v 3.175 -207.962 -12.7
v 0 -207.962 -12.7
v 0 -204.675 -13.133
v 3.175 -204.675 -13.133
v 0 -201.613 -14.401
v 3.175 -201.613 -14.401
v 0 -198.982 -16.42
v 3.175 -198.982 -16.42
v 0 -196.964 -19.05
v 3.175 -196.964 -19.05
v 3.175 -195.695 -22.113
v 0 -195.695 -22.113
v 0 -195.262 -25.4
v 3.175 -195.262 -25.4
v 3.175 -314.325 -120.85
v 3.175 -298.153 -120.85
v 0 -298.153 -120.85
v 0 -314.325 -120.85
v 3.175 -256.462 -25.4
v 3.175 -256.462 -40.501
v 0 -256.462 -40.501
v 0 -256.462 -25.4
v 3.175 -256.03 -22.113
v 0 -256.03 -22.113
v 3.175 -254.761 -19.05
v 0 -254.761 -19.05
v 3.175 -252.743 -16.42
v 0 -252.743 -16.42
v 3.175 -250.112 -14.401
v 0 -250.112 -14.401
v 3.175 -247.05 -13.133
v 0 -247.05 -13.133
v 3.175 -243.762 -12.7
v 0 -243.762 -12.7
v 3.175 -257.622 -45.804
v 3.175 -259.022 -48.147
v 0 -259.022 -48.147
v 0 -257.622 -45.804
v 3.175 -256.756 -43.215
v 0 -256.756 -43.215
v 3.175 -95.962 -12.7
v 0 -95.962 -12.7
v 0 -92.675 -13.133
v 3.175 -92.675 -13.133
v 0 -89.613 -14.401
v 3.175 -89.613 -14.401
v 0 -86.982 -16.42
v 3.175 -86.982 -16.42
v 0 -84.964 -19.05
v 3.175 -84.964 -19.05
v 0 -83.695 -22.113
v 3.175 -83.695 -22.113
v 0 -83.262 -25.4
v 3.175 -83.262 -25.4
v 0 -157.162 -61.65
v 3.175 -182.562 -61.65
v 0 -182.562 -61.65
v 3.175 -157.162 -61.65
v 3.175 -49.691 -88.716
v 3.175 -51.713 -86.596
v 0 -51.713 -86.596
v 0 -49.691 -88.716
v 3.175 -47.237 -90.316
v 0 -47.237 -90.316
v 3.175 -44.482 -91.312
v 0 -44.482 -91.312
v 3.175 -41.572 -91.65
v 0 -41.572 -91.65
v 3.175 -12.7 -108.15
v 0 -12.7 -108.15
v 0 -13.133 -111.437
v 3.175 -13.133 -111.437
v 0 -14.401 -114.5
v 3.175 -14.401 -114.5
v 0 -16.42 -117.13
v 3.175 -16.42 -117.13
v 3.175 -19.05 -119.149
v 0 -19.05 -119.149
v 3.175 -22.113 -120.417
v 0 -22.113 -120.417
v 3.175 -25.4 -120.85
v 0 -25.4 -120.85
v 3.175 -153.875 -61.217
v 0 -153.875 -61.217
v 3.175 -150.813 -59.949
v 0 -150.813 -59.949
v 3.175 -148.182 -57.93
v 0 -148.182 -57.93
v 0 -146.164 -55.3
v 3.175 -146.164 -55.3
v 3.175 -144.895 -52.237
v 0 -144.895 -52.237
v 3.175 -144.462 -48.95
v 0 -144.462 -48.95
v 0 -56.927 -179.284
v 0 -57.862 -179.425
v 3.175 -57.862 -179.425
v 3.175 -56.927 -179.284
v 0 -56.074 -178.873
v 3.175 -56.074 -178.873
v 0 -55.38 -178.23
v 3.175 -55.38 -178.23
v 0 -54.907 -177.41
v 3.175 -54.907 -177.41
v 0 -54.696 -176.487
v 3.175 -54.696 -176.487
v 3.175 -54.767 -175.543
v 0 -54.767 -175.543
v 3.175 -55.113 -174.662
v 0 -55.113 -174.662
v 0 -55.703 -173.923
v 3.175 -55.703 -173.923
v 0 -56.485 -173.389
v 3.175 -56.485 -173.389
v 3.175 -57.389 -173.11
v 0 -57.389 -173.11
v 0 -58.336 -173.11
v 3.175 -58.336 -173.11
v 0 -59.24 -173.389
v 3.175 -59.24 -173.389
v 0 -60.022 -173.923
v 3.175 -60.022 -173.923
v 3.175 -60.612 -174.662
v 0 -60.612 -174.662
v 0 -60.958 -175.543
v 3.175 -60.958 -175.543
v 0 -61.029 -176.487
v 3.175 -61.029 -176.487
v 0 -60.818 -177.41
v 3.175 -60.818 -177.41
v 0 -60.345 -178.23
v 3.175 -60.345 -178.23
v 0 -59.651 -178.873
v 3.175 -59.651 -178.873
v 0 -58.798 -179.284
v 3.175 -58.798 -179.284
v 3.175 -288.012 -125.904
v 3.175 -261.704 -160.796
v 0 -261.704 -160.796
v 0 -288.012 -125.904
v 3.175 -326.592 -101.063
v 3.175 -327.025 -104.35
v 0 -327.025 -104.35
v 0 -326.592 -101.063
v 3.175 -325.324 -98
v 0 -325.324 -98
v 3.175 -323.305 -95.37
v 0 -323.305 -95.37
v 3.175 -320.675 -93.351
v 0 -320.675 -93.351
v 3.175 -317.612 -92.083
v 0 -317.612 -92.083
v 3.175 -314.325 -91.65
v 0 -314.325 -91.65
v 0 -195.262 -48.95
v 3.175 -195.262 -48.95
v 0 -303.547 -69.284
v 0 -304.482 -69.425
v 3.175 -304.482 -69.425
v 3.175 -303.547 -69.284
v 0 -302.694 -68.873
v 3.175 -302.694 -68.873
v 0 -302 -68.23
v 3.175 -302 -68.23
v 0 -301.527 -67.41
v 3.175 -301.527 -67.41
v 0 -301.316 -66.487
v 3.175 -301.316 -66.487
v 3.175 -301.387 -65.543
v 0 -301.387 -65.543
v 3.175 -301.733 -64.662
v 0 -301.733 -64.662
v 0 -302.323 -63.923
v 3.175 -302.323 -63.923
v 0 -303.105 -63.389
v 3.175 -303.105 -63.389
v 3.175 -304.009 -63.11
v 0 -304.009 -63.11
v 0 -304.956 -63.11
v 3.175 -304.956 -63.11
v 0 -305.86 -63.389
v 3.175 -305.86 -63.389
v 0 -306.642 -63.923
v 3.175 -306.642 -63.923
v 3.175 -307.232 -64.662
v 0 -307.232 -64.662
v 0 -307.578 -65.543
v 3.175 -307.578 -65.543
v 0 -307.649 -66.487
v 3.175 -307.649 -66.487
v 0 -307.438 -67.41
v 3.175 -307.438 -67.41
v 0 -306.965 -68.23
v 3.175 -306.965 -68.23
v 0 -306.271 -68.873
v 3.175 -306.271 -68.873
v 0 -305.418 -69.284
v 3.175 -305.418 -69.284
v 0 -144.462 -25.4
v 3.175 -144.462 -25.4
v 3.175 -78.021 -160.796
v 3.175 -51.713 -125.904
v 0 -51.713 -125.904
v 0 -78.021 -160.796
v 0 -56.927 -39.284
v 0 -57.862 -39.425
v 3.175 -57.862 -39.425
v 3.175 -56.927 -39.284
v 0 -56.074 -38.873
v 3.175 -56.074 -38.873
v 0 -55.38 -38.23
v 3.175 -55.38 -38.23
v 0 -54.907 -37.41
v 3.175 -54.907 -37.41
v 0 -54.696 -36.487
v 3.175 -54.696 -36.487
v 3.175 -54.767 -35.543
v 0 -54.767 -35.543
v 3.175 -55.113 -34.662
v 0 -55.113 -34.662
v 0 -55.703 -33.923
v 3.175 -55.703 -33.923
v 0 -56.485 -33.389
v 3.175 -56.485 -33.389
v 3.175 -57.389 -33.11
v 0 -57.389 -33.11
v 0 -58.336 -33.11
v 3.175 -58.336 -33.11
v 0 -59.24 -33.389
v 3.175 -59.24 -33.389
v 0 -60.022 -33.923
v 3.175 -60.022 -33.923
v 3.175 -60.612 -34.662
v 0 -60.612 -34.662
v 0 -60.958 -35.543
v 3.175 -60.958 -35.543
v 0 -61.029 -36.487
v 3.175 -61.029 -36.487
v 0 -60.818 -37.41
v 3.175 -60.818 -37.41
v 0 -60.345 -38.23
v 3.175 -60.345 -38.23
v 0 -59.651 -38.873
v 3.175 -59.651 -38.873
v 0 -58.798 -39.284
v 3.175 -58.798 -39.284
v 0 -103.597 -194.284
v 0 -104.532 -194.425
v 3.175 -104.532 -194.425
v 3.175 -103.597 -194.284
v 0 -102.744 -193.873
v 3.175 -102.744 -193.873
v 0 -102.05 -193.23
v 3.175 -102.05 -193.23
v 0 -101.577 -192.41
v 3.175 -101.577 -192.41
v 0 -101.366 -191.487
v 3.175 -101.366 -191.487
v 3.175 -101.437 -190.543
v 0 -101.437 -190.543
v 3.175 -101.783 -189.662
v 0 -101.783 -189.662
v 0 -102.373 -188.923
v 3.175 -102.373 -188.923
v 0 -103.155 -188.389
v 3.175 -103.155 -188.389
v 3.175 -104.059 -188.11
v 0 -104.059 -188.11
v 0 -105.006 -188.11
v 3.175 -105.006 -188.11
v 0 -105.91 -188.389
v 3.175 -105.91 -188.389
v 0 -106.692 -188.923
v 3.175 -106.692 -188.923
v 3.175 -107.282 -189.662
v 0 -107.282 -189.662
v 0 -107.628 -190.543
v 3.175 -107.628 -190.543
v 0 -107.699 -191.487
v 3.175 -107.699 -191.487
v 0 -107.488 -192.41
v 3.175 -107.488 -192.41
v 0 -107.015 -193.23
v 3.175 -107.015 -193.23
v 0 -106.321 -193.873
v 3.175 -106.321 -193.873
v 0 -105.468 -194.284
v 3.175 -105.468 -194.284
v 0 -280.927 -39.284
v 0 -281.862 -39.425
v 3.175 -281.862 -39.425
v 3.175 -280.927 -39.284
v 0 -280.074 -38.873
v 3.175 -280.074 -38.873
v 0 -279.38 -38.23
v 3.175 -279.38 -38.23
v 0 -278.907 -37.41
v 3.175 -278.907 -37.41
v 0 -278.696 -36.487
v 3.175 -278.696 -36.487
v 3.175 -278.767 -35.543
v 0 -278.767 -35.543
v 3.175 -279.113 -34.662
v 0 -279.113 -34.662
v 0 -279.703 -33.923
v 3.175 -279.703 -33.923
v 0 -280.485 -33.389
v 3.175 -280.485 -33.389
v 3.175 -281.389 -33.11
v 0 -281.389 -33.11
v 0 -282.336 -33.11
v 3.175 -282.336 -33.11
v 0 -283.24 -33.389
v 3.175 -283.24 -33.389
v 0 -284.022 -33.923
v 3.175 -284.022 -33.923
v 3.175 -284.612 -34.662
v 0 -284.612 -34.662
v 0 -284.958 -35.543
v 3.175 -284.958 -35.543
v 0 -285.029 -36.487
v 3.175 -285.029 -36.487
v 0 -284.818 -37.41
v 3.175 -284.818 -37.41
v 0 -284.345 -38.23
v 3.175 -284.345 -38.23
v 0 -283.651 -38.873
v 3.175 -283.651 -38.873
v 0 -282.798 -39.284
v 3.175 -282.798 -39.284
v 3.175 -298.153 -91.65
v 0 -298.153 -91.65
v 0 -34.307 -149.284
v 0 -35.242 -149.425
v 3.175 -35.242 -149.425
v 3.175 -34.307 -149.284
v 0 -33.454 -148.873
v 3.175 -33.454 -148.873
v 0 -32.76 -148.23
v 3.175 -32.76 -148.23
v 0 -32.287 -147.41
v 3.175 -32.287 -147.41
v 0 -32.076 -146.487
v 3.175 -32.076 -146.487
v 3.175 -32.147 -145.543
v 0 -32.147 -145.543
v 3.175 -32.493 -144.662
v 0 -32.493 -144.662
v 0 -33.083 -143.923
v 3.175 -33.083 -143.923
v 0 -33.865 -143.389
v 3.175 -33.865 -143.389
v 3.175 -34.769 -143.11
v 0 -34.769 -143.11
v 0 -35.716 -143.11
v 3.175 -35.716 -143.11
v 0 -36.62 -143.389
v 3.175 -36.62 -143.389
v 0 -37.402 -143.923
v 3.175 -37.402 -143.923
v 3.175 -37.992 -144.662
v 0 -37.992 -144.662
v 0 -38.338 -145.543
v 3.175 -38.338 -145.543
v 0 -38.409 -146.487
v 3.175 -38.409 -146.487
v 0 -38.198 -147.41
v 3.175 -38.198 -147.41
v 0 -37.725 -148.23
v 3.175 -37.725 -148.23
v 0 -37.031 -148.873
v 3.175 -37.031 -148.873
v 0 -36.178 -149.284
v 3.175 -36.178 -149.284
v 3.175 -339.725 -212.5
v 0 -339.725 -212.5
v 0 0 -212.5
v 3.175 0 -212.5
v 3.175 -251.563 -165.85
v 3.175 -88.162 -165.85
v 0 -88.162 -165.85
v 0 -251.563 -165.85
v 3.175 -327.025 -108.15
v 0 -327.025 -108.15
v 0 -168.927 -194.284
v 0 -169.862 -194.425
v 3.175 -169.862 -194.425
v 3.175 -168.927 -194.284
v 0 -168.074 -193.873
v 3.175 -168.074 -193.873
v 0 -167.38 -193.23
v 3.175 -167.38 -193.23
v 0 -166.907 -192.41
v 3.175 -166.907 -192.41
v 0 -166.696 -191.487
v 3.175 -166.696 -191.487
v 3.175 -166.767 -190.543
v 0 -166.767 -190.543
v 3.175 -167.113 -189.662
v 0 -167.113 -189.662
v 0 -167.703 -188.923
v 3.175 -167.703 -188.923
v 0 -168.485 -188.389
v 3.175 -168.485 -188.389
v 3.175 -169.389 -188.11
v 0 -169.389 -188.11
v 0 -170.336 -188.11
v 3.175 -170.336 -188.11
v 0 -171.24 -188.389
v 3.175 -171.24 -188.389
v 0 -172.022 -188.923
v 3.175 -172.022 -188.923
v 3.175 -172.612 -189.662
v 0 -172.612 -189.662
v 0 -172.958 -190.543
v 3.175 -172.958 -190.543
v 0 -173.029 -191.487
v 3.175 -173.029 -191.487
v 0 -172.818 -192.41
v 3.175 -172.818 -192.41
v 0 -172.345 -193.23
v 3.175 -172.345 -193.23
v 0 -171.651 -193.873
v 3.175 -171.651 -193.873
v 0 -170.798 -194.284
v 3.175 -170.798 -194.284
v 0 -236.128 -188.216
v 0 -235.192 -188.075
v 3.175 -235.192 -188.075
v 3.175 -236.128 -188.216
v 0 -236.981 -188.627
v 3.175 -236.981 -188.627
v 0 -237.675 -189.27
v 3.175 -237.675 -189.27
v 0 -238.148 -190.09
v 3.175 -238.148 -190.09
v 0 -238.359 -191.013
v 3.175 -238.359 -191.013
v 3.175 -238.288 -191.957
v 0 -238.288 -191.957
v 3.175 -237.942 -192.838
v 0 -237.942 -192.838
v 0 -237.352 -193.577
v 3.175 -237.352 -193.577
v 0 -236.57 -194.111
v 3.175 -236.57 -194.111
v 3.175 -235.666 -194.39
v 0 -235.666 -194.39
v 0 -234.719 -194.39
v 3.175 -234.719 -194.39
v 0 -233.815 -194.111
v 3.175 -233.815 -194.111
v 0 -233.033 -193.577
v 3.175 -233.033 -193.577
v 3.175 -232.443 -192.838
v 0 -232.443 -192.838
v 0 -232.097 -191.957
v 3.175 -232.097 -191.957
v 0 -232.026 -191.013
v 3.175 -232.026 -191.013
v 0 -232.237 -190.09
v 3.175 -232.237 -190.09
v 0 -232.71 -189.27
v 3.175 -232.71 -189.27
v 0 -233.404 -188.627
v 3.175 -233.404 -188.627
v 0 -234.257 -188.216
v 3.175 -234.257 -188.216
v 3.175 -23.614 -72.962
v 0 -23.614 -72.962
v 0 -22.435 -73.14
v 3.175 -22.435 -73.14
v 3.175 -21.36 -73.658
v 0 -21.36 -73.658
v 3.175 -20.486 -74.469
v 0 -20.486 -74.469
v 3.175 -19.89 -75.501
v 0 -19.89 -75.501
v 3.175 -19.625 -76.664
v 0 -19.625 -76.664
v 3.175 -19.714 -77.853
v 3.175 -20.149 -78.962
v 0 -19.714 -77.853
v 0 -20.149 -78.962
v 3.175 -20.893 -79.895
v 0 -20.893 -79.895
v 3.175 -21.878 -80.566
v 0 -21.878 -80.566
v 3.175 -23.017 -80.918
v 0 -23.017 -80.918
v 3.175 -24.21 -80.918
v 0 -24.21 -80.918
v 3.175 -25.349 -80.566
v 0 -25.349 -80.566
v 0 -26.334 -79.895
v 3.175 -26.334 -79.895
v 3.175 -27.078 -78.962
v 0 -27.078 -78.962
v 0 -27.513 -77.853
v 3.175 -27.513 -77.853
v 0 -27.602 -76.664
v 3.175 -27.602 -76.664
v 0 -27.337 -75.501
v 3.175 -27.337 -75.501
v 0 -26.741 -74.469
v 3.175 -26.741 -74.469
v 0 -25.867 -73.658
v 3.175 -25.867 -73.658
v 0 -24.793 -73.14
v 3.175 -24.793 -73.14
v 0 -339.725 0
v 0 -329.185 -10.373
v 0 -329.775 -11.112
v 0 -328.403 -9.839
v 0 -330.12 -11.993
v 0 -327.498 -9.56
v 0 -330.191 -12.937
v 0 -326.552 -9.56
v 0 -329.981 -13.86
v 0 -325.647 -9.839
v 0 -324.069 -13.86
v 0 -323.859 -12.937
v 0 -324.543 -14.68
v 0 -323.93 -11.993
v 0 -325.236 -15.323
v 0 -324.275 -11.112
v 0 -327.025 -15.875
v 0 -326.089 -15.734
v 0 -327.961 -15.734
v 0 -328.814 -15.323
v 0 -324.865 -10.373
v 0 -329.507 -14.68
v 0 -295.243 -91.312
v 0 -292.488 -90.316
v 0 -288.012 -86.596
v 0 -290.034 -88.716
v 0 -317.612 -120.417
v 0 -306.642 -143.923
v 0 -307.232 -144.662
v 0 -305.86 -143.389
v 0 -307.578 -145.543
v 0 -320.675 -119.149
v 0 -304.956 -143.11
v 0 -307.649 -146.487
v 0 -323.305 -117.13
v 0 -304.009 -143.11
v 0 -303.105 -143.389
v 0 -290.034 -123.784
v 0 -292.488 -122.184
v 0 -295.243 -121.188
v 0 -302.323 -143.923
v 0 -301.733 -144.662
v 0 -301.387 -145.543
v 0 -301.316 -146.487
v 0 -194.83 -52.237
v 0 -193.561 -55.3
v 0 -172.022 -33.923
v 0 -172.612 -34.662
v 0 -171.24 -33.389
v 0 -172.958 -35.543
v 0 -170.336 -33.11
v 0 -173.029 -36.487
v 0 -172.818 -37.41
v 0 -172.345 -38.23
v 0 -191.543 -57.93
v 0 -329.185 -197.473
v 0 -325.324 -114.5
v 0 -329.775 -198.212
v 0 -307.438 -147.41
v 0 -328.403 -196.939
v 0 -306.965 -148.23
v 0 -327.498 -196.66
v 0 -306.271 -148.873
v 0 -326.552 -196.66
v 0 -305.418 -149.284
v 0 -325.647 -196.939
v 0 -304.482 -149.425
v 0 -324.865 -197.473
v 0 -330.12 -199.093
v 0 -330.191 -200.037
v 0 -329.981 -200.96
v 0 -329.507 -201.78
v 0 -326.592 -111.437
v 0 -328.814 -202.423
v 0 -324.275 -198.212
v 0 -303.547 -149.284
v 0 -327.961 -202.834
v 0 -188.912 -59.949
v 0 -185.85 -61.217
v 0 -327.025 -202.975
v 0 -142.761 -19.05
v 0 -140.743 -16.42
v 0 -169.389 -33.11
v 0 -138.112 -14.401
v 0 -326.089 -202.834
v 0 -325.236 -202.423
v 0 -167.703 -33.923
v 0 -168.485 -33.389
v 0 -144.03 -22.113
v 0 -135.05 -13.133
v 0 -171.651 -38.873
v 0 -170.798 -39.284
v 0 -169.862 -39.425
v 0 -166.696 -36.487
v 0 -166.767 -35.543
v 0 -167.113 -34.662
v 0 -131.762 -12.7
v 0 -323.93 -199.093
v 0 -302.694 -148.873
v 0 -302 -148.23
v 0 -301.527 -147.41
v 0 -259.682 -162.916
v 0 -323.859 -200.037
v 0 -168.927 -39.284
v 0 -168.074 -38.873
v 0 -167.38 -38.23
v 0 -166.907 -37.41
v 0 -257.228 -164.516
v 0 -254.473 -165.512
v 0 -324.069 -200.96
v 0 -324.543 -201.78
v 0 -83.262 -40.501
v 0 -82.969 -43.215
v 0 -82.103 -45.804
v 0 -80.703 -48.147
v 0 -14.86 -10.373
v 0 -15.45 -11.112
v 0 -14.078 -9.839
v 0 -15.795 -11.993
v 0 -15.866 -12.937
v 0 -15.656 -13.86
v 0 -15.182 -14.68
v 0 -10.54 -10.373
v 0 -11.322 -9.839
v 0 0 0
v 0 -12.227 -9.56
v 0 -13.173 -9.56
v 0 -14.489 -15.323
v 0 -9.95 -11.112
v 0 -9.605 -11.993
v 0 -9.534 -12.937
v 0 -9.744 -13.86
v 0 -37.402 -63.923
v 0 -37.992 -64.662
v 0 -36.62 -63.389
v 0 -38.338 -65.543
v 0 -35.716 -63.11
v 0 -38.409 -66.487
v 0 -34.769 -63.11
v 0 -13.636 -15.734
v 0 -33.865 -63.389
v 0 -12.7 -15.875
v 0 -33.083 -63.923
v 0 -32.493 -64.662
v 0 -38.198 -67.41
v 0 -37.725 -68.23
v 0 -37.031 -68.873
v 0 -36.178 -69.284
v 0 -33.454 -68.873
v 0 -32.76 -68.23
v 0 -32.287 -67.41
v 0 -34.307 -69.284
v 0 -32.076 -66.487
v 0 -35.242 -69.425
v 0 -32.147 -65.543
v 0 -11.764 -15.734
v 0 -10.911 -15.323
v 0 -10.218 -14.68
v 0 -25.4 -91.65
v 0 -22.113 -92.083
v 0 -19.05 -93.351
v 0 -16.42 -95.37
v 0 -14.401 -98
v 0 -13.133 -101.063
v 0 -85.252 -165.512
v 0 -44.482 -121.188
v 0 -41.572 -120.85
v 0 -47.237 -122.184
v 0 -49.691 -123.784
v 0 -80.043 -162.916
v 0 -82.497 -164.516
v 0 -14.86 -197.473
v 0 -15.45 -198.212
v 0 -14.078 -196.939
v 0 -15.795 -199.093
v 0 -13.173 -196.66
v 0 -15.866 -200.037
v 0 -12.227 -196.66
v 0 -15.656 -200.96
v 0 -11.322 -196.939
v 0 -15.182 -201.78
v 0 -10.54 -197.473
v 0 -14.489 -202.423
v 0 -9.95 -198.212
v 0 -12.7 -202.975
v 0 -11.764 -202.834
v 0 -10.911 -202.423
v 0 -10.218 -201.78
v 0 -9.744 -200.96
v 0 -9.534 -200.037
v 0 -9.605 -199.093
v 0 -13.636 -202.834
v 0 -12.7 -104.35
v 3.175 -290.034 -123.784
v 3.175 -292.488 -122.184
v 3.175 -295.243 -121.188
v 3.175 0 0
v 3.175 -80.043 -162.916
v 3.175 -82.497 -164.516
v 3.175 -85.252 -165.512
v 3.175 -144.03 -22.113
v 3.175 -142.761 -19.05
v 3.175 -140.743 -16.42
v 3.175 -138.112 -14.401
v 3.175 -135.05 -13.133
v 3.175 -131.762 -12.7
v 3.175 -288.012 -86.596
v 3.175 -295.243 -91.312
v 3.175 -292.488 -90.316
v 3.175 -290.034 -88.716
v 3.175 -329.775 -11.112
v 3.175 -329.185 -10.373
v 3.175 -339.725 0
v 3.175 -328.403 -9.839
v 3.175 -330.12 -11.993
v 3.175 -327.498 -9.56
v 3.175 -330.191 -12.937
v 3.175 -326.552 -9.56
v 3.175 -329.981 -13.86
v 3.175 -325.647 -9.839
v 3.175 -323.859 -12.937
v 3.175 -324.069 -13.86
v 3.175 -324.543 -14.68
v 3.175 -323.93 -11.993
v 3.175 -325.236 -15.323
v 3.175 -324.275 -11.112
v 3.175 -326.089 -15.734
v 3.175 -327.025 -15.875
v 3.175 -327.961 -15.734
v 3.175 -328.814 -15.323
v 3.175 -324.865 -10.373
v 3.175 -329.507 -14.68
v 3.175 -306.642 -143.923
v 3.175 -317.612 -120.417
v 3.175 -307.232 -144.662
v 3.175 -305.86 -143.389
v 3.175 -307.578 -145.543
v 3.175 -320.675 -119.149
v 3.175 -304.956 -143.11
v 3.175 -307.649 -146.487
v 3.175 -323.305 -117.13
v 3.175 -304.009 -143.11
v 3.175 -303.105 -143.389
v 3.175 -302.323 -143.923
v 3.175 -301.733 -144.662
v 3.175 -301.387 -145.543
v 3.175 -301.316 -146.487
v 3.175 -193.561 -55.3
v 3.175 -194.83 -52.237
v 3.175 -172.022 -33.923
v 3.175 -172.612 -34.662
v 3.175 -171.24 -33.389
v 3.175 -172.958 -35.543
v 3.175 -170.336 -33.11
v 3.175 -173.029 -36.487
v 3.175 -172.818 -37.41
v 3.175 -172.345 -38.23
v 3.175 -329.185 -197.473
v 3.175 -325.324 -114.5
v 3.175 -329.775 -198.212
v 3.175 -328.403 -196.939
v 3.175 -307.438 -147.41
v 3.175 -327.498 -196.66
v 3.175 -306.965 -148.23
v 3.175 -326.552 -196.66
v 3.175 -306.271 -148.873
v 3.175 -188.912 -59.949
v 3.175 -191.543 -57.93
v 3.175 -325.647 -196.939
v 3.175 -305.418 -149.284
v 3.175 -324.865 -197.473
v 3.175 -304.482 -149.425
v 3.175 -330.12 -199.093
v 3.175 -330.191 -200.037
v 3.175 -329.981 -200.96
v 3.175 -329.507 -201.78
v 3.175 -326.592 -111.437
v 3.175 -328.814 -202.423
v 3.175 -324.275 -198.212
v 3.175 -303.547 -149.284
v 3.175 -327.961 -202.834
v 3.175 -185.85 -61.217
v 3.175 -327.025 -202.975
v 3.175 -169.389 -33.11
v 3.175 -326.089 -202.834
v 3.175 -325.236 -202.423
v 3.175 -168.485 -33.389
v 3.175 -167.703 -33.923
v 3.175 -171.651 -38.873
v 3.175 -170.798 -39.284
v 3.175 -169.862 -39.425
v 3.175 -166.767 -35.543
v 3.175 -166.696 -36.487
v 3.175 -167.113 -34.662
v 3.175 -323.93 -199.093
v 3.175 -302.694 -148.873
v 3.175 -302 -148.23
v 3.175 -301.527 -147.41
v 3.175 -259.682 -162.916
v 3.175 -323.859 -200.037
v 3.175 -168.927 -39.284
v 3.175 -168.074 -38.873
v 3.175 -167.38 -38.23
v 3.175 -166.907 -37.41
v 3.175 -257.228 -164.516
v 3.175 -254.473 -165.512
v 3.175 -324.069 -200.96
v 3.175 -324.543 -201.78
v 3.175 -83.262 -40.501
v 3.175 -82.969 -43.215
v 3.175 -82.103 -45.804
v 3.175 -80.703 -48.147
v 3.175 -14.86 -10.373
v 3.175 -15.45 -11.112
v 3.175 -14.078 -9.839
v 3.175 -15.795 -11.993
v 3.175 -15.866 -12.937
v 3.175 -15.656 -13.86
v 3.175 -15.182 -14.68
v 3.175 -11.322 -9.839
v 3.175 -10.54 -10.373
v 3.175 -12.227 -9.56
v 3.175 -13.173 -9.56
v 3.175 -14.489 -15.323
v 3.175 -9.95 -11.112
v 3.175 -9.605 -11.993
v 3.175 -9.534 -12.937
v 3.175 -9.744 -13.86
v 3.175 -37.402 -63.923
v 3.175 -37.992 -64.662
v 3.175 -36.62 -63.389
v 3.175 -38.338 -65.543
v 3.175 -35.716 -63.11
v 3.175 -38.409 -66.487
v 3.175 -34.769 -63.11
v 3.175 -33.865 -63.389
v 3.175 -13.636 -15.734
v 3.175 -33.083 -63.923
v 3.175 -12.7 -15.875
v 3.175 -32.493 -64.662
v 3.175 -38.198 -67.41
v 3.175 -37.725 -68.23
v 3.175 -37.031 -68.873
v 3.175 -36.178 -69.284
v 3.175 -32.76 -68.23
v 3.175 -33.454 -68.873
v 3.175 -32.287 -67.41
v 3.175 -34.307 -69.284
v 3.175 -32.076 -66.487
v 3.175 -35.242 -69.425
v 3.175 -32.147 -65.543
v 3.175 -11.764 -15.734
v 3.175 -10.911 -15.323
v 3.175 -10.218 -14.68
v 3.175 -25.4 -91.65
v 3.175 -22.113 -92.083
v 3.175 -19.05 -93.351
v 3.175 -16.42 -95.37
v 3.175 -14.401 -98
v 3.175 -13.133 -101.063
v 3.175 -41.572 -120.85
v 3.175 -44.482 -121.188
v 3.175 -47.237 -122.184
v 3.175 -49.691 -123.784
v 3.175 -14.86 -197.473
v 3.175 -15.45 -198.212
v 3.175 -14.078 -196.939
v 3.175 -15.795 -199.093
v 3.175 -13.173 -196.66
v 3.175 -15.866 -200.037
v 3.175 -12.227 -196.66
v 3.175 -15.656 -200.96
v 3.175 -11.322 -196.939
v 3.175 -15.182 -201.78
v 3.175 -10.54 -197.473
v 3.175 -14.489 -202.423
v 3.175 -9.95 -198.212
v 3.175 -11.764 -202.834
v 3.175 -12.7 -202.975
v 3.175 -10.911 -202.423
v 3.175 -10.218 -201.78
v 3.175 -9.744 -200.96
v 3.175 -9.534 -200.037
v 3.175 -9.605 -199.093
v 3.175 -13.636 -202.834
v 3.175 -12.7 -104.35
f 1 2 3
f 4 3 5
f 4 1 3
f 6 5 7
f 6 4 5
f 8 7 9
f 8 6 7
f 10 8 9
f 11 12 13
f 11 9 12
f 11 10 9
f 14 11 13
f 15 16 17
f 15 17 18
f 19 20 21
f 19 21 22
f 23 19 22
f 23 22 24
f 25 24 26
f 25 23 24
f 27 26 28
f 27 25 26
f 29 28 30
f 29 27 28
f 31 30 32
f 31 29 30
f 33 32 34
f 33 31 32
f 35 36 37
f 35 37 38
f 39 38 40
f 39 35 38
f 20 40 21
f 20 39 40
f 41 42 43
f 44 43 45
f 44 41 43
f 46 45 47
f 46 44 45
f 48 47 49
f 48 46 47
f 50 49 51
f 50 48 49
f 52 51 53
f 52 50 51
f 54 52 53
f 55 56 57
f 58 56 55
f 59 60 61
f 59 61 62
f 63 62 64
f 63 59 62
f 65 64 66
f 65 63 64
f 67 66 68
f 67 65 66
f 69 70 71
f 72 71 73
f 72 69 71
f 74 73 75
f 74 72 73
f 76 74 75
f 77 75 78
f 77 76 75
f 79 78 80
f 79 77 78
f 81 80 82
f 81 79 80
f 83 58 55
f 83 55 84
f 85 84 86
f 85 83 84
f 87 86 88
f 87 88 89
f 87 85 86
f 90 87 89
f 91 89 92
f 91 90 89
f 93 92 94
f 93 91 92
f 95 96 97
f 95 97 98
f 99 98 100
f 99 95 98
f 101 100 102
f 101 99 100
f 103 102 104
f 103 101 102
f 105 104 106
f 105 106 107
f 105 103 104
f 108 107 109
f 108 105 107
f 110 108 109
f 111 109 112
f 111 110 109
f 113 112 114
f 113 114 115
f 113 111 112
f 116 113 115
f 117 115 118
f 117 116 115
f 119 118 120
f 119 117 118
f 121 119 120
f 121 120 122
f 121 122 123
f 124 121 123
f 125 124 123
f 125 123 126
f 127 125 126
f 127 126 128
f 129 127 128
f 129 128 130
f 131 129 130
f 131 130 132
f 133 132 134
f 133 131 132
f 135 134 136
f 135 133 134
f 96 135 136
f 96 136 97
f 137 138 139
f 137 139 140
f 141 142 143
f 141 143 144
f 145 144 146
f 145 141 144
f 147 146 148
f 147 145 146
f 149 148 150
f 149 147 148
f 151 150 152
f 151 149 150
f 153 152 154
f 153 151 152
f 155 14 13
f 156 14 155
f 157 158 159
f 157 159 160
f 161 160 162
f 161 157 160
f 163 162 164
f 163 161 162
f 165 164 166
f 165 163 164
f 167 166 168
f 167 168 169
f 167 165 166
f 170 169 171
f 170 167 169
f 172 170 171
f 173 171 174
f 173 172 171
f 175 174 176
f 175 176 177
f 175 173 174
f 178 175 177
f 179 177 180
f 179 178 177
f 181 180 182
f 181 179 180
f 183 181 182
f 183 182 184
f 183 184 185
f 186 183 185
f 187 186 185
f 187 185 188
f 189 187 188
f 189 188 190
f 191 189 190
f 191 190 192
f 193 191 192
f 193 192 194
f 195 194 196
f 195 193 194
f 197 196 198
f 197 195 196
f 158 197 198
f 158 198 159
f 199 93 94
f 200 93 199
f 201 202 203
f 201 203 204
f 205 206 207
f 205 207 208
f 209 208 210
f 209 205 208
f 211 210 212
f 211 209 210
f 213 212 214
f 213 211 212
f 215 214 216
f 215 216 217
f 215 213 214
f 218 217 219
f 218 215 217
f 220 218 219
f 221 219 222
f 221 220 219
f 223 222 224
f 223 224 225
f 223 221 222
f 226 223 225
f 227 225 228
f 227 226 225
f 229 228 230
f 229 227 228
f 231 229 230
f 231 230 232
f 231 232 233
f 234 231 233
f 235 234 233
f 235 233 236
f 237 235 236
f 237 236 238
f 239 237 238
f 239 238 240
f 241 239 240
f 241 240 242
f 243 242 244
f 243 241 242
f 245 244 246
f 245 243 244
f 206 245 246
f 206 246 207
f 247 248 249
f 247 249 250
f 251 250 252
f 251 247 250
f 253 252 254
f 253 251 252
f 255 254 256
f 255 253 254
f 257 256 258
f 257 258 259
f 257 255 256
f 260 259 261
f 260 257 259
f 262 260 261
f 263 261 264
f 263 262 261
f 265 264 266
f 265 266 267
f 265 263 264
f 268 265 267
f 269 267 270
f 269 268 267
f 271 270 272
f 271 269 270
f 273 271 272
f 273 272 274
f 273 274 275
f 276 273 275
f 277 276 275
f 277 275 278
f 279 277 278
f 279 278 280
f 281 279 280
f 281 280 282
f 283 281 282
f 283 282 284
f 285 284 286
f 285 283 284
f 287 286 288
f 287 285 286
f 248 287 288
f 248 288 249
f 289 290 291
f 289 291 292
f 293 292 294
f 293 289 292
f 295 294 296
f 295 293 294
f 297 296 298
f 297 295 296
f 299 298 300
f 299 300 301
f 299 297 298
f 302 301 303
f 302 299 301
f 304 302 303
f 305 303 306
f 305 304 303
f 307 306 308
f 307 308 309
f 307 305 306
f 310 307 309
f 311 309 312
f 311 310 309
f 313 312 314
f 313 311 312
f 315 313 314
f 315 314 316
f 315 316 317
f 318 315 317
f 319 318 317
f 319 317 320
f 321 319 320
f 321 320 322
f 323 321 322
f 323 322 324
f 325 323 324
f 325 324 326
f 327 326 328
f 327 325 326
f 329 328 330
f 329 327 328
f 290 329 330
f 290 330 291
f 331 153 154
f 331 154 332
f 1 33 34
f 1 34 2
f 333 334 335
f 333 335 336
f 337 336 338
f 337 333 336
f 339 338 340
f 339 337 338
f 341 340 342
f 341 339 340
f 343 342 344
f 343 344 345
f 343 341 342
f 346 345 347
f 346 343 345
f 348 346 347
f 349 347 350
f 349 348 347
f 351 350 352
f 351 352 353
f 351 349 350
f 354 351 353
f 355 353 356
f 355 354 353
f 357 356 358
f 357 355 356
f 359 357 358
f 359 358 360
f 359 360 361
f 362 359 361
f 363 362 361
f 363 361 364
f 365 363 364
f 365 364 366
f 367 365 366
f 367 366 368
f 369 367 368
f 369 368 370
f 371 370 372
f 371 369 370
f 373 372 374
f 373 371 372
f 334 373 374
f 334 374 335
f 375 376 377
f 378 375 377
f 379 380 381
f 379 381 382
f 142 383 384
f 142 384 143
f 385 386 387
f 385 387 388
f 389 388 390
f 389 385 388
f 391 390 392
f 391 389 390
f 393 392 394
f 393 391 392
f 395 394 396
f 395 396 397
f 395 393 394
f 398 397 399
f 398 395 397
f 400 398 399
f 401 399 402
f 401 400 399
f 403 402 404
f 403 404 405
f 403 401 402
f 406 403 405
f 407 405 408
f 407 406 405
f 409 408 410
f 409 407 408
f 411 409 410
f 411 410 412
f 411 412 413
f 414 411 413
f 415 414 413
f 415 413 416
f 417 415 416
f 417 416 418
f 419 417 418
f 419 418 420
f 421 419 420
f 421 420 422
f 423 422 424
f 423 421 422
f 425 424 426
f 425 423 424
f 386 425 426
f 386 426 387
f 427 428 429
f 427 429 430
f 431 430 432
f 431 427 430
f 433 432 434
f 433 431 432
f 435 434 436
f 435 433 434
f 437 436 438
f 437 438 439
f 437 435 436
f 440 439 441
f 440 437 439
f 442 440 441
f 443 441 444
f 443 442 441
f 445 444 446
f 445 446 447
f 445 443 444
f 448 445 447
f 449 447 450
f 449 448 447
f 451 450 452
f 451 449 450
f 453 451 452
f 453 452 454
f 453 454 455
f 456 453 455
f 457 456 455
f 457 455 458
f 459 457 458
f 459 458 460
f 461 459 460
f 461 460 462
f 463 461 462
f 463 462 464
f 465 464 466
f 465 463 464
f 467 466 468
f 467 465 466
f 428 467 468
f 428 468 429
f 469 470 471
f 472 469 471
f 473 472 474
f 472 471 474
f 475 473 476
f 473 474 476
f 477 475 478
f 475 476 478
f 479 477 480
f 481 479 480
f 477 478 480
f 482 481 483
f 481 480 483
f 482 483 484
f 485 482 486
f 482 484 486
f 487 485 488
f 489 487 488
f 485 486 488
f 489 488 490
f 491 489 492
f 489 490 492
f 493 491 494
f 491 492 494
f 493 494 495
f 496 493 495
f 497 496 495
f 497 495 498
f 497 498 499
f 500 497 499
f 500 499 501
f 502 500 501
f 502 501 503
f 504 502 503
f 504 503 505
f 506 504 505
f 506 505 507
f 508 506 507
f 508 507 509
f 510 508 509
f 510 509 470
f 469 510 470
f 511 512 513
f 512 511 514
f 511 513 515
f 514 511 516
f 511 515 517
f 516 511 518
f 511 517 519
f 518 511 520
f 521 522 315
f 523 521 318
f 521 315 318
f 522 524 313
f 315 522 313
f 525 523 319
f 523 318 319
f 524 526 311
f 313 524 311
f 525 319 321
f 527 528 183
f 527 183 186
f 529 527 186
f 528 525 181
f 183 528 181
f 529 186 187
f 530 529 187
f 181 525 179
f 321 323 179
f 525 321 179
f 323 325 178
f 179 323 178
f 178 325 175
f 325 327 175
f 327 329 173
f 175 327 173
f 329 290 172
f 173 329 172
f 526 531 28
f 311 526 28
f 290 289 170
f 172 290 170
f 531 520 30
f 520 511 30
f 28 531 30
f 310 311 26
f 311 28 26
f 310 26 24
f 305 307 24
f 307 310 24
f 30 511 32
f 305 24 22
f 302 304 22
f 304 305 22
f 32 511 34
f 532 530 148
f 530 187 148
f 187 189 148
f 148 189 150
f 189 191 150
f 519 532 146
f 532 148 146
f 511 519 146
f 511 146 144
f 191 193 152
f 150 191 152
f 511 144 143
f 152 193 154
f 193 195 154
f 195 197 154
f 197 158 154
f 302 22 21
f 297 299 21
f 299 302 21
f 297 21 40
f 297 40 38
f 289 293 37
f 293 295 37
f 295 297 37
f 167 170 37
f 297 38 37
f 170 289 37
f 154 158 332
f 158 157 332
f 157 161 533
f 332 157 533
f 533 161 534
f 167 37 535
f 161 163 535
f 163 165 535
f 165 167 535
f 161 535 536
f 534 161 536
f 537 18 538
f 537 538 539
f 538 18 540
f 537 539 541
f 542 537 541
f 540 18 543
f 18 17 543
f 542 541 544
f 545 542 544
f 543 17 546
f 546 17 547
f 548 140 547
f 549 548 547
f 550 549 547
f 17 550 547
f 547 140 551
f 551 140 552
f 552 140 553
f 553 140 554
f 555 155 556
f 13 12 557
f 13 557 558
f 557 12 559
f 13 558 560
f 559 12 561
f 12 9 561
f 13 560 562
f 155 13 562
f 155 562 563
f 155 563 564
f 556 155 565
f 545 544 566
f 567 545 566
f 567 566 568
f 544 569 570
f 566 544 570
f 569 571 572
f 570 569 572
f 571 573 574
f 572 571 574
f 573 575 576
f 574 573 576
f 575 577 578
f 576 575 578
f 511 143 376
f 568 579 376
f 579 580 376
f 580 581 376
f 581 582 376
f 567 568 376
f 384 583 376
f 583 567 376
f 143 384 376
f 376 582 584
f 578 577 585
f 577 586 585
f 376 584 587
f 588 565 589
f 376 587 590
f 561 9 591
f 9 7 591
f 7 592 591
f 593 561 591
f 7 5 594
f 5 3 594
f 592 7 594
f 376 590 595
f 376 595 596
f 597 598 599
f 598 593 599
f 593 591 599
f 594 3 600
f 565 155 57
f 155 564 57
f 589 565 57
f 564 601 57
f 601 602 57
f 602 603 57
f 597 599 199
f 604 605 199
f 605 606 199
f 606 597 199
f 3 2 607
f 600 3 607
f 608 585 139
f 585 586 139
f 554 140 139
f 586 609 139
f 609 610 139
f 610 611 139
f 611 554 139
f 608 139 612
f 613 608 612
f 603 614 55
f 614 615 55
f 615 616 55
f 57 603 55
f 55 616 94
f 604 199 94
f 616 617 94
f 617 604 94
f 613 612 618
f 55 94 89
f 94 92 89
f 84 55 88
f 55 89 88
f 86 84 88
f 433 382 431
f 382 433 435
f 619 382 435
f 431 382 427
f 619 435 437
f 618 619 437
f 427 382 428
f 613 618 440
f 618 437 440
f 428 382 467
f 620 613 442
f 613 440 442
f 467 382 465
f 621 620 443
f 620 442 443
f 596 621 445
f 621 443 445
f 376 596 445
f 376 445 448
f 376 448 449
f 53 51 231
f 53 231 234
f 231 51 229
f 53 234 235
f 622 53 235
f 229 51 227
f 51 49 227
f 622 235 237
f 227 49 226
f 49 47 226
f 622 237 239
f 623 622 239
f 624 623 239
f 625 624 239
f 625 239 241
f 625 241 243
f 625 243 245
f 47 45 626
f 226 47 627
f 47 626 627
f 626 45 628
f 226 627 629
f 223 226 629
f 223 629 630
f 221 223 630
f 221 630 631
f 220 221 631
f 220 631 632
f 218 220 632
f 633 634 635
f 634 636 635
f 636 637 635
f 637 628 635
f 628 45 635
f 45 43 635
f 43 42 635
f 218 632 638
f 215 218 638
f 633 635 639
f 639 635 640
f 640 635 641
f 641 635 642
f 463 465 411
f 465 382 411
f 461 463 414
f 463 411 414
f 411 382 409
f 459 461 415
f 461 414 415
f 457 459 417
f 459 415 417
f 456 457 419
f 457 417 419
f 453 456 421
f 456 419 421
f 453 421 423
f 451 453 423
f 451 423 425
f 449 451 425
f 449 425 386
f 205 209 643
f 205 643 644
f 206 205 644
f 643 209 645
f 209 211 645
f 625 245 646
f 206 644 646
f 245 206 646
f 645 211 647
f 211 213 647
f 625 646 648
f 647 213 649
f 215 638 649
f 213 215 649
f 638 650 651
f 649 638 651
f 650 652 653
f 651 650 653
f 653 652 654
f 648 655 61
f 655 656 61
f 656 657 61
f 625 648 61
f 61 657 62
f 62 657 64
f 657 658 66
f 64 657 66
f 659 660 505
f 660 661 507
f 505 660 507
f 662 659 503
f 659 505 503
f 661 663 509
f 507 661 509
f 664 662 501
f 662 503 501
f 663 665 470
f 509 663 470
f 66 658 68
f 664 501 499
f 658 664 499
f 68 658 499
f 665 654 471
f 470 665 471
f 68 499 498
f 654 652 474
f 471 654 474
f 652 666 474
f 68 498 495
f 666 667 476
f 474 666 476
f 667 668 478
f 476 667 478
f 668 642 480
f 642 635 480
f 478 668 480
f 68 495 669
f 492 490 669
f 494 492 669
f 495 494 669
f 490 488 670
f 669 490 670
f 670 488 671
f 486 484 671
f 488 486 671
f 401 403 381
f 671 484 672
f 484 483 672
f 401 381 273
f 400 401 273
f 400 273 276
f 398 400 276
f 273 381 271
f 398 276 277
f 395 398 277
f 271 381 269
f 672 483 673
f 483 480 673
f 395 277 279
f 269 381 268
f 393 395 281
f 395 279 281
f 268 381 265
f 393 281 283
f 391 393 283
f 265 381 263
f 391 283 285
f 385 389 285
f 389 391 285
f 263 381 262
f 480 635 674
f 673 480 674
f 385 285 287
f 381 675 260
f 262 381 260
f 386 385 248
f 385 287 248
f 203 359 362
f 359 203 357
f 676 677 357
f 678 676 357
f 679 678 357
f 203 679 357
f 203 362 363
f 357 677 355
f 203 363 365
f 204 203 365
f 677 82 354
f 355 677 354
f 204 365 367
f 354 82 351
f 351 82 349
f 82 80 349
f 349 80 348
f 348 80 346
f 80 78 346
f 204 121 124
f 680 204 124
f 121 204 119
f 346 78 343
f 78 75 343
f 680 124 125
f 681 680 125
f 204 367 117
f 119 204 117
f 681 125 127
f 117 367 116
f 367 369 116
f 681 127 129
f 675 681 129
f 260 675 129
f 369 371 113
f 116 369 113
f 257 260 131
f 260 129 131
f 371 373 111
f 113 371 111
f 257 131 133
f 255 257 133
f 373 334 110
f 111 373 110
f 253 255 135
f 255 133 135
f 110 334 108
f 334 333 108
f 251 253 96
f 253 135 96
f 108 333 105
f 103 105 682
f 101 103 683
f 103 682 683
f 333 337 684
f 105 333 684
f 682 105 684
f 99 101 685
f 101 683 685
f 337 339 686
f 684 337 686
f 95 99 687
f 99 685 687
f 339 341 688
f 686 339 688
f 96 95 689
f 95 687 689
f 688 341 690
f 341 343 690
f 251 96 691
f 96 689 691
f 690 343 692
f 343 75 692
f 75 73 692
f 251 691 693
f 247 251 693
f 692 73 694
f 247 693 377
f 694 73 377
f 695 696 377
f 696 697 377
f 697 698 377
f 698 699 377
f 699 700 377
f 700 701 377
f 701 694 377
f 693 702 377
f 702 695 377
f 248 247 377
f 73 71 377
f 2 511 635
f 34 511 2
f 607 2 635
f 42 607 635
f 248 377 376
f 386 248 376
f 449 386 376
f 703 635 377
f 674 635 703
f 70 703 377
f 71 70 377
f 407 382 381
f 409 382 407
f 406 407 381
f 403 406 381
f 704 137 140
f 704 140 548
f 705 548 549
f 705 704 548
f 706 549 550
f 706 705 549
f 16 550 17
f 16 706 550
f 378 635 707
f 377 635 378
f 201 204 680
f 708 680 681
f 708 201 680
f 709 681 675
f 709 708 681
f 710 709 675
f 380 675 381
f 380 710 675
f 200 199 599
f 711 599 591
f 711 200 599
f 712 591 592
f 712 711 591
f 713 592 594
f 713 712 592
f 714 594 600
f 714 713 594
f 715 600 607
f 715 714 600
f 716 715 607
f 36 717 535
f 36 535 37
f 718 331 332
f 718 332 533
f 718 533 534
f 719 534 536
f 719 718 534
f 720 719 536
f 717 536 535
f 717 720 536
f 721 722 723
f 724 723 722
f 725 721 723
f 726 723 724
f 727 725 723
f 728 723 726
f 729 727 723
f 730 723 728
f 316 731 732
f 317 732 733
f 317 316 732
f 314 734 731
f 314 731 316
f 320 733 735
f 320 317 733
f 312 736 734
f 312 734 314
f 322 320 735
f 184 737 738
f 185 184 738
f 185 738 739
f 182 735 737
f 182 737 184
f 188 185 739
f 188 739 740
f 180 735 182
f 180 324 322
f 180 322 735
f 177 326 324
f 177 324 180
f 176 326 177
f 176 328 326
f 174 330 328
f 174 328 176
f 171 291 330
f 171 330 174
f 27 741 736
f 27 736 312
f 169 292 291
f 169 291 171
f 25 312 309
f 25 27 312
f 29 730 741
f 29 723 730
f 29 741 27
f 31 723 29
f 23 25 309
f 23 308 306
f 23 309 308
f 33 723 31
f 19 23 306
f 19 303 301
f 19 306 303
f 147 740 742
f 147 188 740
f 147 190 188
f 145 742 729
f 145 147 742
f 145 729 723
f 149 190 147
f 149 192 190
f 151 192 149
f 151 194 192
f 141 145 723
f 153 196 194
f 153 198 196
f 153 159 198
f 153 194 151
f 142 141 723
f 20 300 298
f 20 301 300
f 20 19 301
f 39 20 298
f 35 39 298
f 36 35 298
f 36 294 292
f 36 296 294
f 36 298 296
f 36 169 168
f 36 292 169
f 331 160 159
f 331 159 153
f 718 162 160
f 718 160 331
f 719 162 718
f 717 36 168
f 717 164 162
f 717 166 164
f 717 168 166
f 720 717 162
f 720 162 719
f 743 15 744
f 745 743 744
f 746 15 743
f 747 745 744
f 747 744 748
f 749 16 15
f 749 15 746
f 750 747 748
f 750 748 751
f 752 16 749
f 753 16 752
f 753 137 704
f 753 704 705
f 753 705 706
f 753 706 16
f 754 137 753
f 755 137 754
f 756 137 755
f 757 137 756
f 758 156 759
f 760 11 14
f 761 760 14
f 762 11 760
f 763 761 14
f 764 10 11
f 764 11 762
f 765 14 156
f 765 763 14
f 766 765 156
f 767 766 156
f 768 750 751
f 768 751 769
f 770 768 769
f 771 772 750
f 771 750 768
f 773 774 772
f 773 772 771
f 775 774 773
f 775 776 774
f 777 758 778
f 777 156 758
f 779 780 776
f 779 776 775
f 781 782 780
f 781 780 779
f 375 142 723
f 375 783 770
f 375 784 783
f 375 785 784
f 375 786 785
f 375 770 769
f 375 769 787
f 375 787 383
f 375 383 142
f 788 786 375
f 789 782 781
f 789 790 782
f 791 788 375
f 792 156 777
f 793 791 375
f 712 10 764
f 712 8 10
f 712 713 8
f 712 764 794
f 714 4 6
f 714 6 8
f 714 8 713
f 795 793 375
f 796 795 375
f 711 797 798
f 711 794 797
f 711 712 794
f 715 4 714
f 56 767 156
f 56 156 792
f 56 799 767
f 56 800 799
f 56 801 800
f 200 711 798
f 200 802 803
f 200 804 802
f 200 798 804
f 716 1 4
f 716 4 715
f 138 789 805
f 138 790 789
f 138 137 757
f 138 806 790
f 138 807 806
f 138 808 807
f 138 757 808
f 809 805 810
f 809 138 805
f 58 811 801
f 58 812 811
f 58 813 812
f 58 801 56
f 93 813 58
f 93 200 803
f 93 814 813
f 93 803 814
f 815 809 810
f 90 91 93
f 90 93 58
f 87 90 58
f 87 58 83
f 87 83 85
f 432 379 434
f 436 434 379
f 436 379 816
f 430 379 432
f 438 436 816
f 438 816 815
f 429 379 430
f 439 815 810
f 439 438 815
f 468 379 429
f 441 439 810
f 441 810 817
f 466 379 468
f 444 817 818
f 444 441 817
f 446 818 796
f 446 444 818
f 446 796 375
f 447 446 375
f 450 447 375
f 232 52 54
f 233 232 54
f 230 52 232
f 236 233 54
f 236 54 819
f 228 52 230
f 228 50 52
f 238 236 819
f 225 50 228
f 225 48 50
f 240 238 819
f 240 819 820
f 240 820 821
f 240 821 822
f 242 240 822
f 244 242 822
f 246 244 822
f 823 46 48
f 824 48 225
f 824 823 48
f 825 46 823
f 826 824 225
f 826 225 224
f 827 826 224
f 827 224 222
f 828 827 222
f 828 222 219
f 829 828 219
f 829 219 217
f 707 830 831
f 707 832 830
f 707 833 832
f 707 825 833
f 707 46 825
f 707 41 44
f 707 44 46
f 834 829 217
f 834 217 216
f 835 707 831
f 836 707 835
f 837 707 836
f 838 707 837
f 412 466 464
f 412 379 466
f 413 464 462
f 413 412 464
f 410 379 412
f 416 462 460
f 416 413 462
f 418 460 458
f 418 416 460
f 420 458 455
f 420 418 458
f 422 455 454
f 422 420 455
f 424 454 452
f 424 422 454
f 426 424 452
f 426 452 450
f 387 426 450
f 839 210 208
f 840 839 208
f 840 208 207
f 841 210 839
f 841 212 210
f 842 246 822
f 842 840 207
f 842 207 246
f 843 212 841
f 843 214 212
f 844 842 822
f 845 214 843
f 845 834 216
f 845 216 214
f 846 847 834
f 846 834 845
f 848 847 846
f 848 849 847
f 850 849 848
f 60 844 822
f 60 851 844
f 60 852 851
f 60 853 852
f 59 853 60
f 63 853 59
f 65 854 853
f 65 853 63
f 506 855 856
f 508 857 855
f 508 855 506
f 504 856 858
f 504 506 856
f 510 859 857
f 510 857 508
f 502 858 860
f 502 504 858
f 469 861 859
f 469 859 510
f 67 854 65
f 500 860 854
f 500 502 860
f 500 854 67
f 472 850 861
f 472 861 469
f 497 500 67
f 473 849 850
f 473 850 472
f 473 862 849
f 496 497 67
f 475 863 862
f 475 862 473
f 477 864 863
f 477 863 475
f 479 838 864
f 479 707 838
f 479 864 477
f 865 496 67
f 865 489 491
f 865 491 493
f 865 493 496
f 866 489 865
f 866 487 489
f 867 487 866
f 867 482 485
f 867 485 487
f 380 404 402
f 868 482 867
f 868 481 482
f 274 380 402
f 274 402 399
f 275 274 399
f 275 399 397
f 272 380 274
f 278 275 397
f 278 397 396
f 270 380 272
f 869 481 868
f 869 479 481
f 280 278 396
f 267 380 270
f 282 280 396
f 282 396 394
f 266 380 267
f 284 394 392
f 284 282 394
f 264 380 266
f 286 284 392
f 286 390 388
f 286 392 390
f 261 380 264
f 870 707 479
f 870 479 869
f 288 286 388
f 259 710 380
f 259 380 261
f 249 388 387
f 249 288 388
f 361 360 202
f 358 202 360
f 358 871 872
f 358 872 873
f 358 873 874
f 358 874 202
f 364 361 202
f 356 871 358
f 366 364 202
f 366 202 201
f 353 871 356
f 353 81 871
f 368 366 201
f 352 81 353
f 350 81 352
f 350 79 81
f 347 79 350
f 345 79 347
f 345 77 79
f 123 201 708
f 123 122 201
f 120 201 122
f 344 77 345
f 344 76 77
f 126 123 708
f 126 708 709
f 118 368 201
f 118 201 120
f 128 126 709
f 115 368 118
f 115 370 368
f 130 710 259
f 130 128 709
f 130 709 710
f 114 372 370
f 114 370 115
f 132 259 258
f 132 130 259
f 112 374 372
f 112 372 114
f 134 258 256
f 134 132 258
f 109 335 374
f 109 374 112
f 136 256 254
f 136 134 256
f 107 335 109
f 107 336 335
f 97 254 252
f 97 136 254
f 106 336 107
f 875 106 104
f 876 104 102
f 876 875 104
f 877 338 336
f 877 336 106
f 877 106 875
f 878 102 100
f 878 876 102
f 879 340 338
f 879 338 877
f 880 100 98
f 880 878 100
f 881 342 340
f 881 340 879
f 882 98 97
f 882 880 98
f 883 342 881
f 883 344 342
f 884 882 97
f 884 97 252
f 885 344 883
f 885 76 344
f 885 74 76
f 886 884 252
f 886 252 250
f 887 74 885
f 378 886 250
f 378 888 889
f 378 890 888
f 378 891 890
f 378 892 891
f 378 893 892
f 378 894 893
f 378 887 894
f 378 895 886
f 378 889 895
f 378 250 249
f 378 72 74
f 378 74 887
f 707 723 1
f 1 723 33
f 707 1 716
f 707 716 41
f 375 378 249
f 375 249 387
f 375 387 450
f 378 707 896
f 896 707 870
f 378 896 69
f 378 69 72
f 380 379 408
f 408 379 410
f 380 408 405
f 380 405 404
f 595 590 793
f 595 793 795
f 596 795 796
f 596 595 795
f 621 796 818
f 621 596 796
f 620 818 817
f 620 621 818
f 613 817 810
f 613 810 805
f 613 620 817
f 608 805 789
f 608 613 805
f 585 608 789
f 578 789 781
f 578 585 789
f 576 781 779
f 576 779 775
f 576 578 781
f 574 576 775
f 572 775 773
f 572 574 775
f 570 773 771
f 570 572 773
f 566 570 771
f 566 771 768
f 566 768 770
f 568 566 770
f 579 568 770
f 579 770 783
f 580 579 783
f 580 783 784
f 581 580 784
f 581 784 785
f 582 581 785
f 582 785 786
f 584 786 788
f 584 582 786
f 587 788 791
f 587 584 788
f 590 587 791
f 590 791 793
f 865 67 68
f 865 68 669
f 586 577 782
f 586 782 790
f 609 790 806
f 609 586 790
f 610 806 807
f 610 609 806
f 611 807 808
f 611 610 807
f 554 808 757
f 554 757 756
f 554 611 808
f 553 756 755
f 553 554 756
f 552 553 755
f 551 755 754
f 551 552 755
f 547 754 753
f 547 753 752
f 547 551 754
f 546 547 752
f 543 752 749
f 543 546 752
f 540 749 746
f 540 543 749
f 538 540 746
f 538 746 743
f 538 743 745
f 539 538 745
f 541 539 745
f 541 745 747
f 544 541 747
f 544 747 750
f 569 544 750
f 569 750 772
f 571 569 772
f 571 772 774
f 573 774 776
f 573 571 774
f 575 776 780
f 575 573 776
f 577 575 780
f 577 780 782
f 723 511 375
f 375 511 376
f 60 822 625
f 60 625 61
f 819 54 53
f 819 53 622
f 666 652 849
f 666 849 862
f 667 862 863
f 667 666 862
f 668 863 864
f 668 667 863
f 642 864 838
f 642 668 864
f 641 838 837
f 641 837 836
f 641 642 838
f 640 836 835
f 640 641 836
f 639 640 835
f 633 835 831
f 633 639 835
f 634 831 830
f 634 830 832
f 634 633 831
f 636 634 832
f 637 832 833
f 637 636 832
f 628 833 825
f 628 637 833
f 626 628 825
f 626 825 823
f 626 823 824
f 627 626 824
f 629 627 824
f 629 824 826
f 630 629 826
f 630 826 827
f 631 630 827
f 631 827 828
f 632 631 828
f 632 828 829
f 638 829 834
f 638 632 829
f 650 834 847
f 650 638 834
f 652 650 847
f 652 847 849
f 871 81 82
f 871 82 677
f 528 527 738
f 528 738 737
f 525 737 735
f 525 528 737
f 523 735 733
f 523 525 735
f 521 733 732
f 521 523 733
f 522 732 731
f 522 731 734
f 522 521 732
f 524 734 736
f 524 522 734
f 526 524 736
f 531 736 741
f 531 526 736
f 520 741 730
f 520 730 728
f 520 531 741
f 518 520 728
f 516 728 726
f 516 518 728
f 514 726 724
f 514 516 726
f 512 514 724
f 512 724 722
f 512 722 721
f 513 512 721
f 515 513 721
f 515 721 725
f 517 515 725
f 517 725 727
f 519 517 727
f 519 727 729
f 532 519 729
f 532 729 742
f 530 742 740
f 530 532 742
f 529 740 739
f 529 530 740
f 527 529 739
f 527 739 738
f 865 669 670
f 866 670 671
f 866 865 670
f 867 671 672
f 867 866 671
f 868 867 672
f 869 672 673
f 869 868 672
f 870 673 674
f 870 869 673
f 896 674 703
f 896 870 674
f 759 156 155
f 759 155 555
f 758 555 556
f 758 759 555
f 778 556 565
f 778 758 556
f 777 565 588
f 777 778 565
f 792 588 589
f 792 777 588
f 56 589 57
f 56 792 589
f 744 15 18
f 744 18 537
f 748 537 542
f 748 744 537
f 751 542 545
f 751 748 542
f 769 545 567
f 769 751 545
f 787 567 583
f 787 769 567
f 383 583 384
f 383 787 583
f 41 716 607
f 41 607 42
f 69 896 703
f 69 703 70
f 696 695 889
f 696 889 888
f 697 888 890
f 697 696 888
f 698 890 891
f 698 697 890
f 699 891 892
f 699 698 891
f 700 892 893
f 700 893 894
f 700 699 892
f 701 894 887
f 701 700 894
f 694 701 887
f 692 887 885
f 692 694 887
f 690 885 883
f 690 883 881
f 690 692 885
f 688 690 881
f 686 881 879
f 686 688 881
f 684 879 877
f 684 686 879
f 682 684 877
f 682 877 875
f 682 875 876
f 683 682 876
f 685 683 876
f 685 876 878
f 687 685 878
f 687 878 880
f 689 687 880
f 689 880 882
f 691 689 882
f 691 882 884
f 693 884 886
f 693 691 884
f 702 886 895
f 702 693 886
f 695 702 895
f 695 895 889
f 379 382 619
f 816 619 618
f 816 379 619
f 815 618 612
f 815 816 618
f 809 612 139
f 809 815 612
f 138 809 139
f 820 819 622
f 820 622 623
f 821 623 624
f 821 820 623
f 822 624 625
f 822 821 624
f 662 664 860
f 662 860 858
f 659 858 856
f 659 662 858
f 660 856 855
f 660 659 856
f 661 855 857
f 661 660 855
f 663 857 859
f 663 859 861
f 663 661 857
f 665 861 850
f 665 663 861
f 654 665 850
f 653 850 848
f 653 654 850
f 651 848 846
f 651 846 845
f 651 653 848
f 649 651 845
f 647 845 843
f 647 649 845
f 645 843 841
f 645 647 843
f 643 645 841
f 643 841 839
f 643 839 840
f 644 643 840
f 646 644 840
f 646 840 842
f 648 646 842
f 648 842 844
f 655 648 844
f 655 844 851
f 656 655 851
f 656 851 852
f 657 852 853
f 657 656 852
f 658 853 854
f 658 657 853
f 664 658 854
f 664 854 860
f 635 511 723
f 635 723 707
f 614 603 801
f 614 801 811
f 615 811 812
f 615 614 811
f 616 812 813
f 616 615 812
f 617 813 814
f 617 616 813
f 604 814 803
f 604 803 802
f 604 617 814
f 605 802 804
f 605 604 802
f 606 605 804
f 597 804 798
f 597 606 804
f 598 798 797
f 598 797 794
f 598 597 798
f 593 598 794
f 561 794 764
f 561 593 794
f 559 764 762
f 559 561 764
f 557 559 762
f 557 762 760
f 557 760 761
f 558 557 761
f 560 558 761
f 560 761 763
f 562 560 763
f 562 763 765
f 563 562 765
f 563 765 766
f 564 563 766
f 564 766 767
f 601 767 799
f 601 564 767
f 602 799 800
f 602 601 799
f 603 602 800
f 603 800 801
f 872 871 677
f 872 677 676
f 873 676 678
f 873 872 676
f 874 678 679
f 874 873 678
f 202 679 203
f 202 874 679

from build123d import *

# Parameters (mm, degrees)
SKETCH1_W           = 212.5
SKETCH1_H           = 339.725
SKETCH1_R           = 3.175
BOSS_EXTRUDE1_DEPTH = 3.175
CUT_EXTRUDE1_DEPTH  = 401.72360331
SKETCH3_R           = 4
CUT_EXTRUDE2_DEPTH  = 45.72
SKETCH4_R           = 4
CUT_EXTRUDE3_DEPTH  = 14.986


with BuildPart() as part:
    # Sketch1 → Boss-Extrude1 (new body)
    with BuildSketch(Plane(origin=(0, 0, 0), x_dir=(0, 0, -1), z_dir=(1, 0, 0))):
        with Locations((106.25, -169.8625)):
            Rectangle(SKETCH1_W, SKETCH1_H)
        with Locations((12.7, -12.7)):
            Circle(SKETCH1_R, mode=Mode.SUBTRACT)
        with Locations((199.8, -12.7)):
            Circle(SKETCH1_R, mode=Mode.SUBTRACT)
        with Locations((66.25, -35.2425)):
            Circle(SKETCH1_R, mode=Mode.SUBTRACT)
        with Locations((146.25, -35.2425)):
            Circle(SKETCH1_R, mode=Mode.SUBTRACT)
        with Locations((176.25, -57.8625)):
            Circle(SKETCH1_R, mode=Mode.SUBTRACT)
        with Locations((36.25, -57.8625)):
            Circle(SKETCH1_R, mode=Mode.SUBTRACT)
        with Locations((191.25, -104.5325)):
            Circle(SKETCH1_R, mode=Mode.SUBTRACT)
        with Locations((36.25, -169.8625)):
            Circle(SKETCH1_R, mode=Mode.SUBTRACT)
        with Locations((191.25, -169.8625)):
            Circle(SKETCH1_R, mode=Mode.SUBTRACT)
        with Locations((36.25, -281.8625)):
            Circle(SKETCH1_R, mode=Mode.SUBTRACT)
        with Locations((66.25, -304.4825)):
            Circle(SKETCH1_R, mode=Mode.SUBTRACT)
        with Locations((12.7, -327.025)):
            Circle(SKETCH1_R, mode=Mode.SUBTRACT)
        with Locations((199.8, -327.025)):
            Circle(SKETCH1_R, mode=Mode.SUBTRACT)
        with Locations((146.25, -304.4825)):
            Circle(SKETCH1_R, mode=Mode.SUBTRACT)
        with Locations(Location((191.25, -235.1925, 0), (0, 0, 180))):
            Circle(SKETCH1_R, mode=Mode.SUBTRACT)
    extrude(amount=BOSS_EXTRUDE1_DEPTH)

    # Sketch2 → Cut-Extrude1 (cut, through all)
    with BuildSketch(Plane(origin=(3.175, 0, 0), x_dir=(0, 0, -1), z_dir=(1, 0, 0))):
        with BuildLine():
            Line((165.85, -88.161695758), (165.85, -251.563304242))
            ThreePointArc((165.85, -251.563304242), (164.516472011, -257.22840036), (160.795934799, -261.703801323))
            Line((160.795934799, -261.703801323), (125.904065201, -288.012271))
            ThreePointArc((125.904065201, -288.012271), (122.183527989, -292.487671963), (120.85, -298.152768081))
            Line((120.85, -298.152768081), (120.85, -314.325))
            ThreePointArc((120.85, -314.325), (117.130256121, -323.305256121), (108.15, -327.025))
            Line((108.15, -327.025), (104.35, -327.025))
            ThreePointArc((104.35, -327.025), (95.369743879, -323.305256121), (91.65, -314.325))
            Line((91.65, -314.325), (91.65, -298.152768081))
            ThreePointArc((91.65, -298.152768081), (90.316472011, -292.487671963), (86.595934799, -288.012271))
            Line((86.595934799, -288.012271), (48.147303392, -259.022002919))
            ThreePointArc((48.147303392, -259.022002919), (44.532850149, -257.119362682), (40.501368593, -256.4625))
            Line((40.501368593, -256.4625), (25.4, -256.4625))
            ThreePointArc((25.4, -256.4625), (16.419743879, -252.742756121), (12.7, -243.7625))
            Line((12.7, -243.7625), (12.7, -207.9625))
            ThreePointArc((12.7, -207.9625), (16.419743879, -198.982243879), (25.4, -195.2625))
            Line((25.4, -195.2625), (48.95, -195.2625))
            ThreePointArc((48.95, -195.2625), (57.930256121, -191.542756121), (61.65, -182.5625))
            Line((61.65, -182.5625), (61.65, -157.1625))
            ThreePointArc((61.65, -157.1625), (57.930256121, -148.182243879), (48.95, -144.4625))
            Line((48.95, -144.4625), (25.4, -144.4625))
            ThreePointArc((25.4, -144.4625), (16.419743879, -140.742756121), (12.7, -131.7625))
            Line((12.7, -131.7625), (12.7, -95.9625))
            ThreePointArc((12.7, -95.9625), (16.419743879, -86.982243879), (25.4, -83.2625))
            Line((25.4, -83.2625), (40.501368593, -83.2625))
            ThreePointArc((40.501368593, -83.2625), (44.532850149, -82.605637318), (48.147303392, -80.702997081))
            Line((48.147303392, -80.702997081), (86.595934799, -51.712729))
            ThreePointArc((86.595934799, -51.712729), (90.316472011, -47.237328037), (91.65, -41.572231919))
            Line((91.65, -41.572231919), (91.65, -25.4))
            ThreePointArc((91.65, -25.4), (95.369743879, -16.419743879), (104.35, -12.7))
            Line((104.35, -12.7), (108.15, -12.7))
            ThreePointArc((108.15, -12.7), (117.130256121, -16.419743879), (120.85, -25.4))
            Line((120.85, -25.4), (120.85, -41.572231919))
            ThreePointArc((120.85, -41.572231919), (122.183527989, -47.237328037), (125.904065201, -51.712729))
            Line((125.904065201, -51.712729), (160.795934799, -78.021198677))
            ThreePointArc((160.795934799, -78.021198677), (164.516472011, -82.49659964), (165.85, -88.161695758))
        make_face()
    extrude(amount=-CUT_EXTRUDE1_DEPTH, mode=Mode.SUBTRACT)

    # Sketch3 → Cut-Extrude2 (cut)
    with BuildSketch(Plane.ZY):
        with Locations((-353.343139499, -302.41374809)):
            Circle(SKETCH3_R)
    extrude(amount=-CUT_EXTRUDE2_DEPTH, mode=Mode.SUBTRACT)

    # Sketch4 → Cut-Extrude3 (cut)
    with BuildSketch(Plane.ZY):
        with Locations((-76.9625, -23.613540107)):
            Circle(SKETCH4_R)
    extrude(amount=-CUT_EXTRUDE3_DEPTH, mode=Mode.SUBTRACT)


solid = part.part
